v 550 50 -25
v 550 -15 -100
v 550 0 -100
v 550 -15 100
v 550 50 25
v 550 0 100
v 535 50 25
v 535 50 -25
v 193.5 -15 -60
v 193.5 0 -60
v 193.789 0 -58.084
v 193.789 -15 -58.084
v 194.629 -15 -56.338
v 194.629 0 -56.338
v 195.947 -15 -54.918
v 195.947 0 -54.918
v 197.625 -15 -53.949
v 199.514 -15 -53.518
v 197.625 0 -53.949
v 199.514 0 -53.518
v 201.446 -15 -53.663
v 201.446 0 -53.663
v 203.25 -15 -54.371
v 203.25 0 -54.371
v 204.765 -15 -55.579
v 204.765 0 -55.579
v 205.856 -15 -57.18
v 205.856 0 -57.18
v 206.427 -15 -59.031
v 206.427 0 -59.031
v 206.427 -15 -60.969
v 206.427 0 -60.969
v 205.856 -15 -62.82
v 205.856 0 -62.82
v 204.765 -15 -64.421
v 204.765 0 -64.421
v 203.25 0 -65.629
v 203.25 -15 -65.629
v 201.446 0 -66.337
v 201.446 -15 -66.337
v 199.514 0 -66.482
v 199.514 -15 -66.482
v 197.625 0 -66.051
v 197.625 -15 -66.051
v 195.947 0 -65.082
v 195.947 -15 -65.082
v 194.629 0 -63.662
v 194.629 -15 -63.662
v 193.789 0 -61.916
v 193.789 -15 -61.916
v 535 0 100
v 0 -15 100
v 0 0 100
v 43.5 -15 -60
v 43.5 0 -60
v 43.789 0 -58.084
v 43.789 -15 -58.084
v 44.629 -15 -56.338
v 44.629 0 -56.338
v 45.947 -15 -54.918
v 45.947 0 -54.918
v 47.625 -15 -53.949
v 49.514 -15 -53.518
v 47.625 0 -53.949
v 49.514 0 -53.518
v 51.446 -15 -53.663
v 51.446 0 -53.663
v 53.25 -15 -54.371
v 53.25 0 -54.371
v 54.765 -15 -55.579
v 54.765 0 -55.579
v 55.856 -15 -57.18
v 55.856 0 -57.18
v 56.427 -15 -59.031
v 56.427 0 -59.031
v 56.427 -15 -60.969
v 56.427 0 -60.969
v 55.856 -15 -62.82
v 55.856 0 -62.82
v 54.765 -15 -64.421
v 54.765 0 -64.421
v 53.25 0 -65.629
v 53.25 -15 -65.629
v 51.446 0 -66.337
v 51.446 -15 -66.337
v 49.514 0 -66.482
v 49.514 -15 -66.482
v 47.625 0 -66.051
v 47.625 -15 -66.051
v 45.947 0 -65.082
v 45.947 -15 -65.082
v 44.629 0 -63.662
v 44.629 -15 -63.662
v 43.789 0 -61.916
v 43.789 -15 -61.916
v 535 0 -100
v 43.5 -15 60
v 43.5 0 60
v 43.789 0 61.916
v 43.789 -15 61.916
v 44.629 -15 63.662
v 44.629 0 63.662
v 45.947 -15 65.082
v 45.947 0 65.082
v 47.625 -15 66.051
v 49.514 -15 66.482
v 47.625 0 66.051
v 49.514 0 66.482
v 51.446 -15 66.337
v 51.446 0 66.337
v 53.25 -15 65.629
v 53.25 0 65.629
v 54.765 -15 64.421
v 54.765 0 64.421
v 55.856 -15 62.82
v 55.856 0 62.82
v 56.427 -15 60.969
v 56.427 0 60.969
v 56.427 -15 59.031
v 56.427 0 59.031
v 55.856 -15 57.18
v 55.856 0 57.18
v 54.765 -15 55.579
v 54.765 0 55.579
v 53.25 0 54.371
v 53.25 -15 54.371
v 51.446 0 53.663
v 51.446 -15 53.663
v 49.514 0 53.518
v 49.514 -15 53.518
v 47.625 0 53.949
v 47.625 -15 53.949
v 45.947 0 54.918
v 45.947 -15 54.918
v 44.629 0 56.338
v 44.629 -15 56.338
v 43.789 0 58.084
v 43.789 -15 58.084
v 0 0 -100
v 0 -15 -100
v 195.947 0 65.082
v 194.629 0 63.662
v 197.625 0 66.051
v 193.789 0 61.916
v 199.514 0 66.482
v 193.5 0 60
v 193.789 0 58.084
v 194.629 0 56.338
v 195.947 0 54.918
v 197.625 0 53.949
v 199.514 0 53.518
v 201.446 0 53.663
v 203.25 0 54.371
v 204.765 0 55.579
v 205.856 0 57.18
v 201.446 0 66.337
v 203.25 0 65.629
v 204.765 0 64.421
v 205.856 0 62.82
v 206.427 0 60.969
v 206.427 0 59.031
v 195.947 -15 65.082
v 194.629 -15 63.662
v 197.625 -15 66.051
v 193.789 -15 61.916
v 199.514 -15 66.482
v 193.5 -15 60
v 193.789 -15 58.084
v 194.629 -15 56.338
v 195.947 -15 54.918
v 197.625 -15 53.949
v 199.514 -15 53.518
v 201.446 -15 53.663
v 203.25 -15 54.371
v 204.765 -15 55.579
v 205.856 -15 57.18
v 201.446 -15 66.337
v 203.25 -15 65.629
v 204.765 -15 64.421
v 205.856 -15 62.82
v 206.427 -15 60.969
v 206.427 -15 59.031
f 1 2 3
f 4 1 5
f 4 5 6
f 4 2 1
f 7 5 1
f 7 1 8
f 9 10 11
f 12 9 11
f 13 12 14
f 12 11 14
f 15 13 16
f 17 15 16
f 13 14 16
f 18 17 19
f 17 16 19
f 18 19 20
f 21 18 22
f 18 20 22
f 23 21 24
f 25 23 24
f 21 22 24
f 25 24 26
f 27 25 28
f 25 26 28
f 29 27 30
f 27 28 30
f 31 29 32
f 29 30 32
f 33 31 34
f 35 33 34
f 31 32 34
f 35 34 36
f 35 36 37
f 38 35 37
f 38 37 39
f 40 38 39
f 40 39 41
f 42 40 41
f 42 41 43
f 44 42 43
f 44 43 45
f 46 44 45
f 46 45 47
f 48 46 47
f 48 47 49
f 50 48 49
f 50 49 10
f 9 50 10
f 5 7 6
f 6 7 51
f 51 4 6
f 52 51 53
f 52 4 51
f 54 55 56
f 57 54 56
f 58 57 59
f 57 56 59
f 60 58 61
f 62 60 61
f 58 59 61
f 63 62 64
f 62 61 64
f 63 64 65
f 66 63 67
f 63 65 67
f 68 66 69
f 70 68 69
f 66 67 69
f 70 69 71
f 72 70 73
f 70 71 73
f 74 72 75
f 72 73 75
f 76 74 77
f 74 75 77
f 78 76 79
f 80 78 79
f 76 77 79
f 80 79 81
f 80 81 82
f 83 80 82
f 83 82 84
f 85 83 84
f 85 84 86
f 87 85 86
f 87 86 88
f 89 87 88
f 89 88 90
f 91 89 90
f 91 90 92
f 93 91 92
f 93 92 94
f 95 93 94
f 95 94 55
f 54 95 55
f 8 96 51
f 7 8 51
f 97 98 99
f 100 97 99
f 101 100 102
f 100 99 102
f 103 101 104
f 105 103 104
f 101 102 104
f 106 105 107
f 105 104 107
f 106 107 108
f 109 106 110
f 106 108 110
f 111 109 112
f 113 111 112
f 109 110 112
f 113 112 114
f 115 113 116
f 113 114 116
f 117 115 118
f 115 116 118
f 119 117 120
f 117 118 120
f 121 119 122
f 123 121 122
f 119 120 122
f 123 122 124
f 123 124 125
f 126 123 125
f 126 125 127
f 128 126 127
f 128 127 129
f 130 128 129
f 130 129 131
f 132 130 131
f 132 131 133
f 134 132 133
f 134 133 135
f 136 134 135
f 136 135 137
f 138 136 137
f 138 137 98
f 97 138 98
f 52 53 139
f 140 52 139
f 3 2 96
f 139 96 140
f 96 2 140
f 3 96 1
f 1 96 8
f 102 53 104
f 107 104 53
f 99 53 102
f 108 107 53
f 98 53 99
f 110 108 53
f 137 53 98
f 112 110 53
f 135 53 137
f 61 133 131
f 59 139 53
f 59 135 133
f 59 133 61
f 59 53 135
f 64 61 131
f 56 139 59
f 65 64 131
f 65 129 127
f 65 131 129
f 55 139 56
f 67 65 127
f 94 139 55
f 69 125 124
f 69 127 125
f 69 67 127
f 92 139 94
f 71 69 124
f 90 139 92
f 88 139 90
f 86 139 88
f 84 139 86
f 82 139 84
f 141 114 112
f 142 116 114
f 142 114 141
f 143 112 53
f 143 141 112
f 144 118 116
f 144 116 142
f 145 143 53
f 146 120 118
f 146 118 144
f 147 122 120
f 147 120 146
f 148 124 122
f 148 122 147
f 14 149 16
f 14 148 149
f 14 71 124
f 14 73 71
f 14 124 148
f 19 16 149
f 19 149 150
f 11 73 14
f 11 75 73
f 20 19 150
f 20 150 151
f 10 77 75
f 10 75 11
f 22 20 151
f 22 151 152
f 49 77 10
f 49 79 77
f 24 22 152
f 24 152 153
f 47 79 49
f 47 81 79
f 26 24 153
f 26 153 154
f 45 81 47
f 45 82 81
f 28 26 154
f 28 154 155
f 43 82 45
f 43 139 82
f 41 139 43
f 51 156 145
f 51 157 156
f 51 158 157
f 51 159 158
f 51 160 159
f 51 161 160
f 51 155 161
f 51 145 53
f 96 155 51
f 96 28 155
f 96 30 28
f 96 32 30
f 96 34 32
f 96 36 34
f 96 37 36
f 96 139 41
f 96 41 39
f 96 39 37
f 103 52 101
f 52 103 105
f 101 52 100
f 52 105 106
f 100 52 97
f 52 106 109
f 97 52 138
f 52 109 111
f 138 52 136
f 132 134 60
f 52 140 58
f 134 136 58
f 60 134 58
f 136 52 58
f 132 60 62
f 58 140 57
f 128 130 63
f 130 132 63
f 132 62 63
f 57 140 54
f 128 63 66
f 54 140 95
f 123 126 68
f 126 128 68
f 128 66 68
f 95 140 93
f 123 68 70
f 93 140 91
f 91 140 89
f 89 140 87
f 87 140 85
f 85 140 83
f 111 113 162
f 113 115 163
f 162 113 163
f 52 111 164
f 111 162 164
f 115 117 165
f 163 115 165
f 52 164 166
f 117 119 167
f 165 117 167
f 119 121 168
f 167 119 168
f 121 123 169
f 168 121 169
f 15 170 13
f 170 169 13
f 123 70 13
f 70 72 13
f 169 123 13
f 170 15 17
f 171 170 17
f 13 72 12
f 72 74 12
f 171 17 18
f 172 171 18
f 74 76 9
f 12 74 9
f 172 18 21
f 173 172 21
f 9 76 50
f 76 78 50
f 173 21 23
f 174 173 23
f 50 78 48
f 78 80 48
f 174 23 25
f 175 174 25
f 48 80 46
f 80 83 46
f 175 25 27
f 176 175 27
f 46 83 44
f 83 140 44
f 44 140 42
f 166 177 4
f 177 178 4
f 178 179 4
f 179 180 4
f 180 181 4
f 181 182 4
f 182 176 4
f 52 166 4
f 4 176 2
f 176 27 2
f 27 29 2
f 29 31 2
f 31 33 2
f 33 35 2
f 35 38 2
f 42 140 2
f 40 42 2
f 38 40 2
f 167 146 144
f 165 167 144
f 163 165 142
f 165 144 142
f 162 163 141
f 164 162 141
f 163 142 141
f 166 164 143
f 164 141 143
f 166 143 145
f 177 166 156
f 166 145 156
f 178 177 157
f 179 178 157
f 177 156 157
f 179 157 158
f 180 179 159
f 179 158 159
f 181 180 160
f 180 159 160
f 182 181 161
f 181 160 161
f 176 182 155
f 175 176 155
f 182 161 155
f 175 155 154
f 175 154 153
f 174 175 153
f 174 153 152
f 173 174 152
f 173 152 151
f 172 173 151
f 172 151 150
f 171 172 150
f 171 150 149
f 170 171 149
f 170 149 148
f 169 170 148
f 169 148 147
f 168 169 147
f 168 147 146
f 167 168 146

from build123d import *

# Parameters (mm, degrees)
SKETCH1_W               = 550
SKETCH1_H               = 200
EXTRUDE1_DEPTH          = 15
SKETCH3_W               = 15
SKETCH3_H               = 200
EXTRUDE2_DEPTH          = 50
CUT_EXTRUDE3_DEPTH      = 536
CUT_EXTRUDE3_DEPTH_BACK = 16
CUT_EXTRUDE4_DEPTH      = 536
CUT_EXTRUDE4_DEPTH_BACK = 16
SKETCH8_R               = 6.5
CUT_EXTRUDE5_DEPTH      = 16


with BuildPart() as part:
    # Sketch1 → Extrude1 (new body)
    with BuildSketch(Plane(origin=(0, 0, 0), x_dir=(1, 0, 0), z_dir=(0, 1, 0))):
        with Locations((275, 0)):
            Rectangle(SKETCH1_W, SKETCH1_H)
    extrude(amount=-EXTRUDE1_DEPTH)

    # Sketch3 → Extrude2 (add)
    with BuildSketch(Plane(origin=(0, 0, 0), x_dir=(-1, 0, 0), z_dir=(0, 1, 0))):
        with Locations((-542.5, 0)):
            Rectangle(SKETCH3_W, SKETCH3_H)
    extrude(amount=EXTRUDE2_DEPTH)

    # Sketch4 → Cut-Extrude3 (cut, two sides)
    with BuildSketch(Plane.ZY.offset(-535)) as cut_extrude3_sk:
        Polygon((-100, 50), (-100, 0), (-25, 50), align=None)
    extrude(amount=CUT_EXTRUDE3_DEPTH, mode=Mode.SUBTRACT)
    extrude(cut_extrude3_sk.sketch, amount=-CUT_EXTRUDE3_DEPTH_BACK, mode=Mode.SUBTRACT)

    # Sketch7 → Cut-Extrude4 (cut, two sides)
    with BuildSketch(Plane.ZY.offset(-535)) as cut_extrude4_sk:
        Polygon((451.383627881, -234.255751921), (100, 0), (25, 50), (-326.383627881, 284.255751921), (142.12787596, 987.023007684), (919.895131723, 468.511503842), align=None)
    extrude(amount=CUT_EXTRUDE4_DEPTH, mode=Mode.SUBTRACT)
    extrude(cut_extrude4_sk.sketch, amount=-CUT_EXTRUDE4_DEPTH_BACK, mode=Mode.SUBTRACT)

    # Sketch8 → Cut-Extrude5 (cut, through all)
    with BuildSketch(Plane(origin=(0, 0, 0), x_dir=(-1, 0, 0), z_dir=(0, 1, 0))):
        with Locations((-50, -60)):
            Circle(SKETCH8_R)
        with Locations((-200, -60)):
            Circle(SKETCH8_R)
        with Locations((-50, 60)):
            Circle(SKETCH8_R)
        with Locations((-200, 60)):
            Circle(SKETCH8_R)
    extrude(amount=-CUT_EXTRUDE5_DEPTH, mode=Mode.SUBTRACT)


solid = part.part
